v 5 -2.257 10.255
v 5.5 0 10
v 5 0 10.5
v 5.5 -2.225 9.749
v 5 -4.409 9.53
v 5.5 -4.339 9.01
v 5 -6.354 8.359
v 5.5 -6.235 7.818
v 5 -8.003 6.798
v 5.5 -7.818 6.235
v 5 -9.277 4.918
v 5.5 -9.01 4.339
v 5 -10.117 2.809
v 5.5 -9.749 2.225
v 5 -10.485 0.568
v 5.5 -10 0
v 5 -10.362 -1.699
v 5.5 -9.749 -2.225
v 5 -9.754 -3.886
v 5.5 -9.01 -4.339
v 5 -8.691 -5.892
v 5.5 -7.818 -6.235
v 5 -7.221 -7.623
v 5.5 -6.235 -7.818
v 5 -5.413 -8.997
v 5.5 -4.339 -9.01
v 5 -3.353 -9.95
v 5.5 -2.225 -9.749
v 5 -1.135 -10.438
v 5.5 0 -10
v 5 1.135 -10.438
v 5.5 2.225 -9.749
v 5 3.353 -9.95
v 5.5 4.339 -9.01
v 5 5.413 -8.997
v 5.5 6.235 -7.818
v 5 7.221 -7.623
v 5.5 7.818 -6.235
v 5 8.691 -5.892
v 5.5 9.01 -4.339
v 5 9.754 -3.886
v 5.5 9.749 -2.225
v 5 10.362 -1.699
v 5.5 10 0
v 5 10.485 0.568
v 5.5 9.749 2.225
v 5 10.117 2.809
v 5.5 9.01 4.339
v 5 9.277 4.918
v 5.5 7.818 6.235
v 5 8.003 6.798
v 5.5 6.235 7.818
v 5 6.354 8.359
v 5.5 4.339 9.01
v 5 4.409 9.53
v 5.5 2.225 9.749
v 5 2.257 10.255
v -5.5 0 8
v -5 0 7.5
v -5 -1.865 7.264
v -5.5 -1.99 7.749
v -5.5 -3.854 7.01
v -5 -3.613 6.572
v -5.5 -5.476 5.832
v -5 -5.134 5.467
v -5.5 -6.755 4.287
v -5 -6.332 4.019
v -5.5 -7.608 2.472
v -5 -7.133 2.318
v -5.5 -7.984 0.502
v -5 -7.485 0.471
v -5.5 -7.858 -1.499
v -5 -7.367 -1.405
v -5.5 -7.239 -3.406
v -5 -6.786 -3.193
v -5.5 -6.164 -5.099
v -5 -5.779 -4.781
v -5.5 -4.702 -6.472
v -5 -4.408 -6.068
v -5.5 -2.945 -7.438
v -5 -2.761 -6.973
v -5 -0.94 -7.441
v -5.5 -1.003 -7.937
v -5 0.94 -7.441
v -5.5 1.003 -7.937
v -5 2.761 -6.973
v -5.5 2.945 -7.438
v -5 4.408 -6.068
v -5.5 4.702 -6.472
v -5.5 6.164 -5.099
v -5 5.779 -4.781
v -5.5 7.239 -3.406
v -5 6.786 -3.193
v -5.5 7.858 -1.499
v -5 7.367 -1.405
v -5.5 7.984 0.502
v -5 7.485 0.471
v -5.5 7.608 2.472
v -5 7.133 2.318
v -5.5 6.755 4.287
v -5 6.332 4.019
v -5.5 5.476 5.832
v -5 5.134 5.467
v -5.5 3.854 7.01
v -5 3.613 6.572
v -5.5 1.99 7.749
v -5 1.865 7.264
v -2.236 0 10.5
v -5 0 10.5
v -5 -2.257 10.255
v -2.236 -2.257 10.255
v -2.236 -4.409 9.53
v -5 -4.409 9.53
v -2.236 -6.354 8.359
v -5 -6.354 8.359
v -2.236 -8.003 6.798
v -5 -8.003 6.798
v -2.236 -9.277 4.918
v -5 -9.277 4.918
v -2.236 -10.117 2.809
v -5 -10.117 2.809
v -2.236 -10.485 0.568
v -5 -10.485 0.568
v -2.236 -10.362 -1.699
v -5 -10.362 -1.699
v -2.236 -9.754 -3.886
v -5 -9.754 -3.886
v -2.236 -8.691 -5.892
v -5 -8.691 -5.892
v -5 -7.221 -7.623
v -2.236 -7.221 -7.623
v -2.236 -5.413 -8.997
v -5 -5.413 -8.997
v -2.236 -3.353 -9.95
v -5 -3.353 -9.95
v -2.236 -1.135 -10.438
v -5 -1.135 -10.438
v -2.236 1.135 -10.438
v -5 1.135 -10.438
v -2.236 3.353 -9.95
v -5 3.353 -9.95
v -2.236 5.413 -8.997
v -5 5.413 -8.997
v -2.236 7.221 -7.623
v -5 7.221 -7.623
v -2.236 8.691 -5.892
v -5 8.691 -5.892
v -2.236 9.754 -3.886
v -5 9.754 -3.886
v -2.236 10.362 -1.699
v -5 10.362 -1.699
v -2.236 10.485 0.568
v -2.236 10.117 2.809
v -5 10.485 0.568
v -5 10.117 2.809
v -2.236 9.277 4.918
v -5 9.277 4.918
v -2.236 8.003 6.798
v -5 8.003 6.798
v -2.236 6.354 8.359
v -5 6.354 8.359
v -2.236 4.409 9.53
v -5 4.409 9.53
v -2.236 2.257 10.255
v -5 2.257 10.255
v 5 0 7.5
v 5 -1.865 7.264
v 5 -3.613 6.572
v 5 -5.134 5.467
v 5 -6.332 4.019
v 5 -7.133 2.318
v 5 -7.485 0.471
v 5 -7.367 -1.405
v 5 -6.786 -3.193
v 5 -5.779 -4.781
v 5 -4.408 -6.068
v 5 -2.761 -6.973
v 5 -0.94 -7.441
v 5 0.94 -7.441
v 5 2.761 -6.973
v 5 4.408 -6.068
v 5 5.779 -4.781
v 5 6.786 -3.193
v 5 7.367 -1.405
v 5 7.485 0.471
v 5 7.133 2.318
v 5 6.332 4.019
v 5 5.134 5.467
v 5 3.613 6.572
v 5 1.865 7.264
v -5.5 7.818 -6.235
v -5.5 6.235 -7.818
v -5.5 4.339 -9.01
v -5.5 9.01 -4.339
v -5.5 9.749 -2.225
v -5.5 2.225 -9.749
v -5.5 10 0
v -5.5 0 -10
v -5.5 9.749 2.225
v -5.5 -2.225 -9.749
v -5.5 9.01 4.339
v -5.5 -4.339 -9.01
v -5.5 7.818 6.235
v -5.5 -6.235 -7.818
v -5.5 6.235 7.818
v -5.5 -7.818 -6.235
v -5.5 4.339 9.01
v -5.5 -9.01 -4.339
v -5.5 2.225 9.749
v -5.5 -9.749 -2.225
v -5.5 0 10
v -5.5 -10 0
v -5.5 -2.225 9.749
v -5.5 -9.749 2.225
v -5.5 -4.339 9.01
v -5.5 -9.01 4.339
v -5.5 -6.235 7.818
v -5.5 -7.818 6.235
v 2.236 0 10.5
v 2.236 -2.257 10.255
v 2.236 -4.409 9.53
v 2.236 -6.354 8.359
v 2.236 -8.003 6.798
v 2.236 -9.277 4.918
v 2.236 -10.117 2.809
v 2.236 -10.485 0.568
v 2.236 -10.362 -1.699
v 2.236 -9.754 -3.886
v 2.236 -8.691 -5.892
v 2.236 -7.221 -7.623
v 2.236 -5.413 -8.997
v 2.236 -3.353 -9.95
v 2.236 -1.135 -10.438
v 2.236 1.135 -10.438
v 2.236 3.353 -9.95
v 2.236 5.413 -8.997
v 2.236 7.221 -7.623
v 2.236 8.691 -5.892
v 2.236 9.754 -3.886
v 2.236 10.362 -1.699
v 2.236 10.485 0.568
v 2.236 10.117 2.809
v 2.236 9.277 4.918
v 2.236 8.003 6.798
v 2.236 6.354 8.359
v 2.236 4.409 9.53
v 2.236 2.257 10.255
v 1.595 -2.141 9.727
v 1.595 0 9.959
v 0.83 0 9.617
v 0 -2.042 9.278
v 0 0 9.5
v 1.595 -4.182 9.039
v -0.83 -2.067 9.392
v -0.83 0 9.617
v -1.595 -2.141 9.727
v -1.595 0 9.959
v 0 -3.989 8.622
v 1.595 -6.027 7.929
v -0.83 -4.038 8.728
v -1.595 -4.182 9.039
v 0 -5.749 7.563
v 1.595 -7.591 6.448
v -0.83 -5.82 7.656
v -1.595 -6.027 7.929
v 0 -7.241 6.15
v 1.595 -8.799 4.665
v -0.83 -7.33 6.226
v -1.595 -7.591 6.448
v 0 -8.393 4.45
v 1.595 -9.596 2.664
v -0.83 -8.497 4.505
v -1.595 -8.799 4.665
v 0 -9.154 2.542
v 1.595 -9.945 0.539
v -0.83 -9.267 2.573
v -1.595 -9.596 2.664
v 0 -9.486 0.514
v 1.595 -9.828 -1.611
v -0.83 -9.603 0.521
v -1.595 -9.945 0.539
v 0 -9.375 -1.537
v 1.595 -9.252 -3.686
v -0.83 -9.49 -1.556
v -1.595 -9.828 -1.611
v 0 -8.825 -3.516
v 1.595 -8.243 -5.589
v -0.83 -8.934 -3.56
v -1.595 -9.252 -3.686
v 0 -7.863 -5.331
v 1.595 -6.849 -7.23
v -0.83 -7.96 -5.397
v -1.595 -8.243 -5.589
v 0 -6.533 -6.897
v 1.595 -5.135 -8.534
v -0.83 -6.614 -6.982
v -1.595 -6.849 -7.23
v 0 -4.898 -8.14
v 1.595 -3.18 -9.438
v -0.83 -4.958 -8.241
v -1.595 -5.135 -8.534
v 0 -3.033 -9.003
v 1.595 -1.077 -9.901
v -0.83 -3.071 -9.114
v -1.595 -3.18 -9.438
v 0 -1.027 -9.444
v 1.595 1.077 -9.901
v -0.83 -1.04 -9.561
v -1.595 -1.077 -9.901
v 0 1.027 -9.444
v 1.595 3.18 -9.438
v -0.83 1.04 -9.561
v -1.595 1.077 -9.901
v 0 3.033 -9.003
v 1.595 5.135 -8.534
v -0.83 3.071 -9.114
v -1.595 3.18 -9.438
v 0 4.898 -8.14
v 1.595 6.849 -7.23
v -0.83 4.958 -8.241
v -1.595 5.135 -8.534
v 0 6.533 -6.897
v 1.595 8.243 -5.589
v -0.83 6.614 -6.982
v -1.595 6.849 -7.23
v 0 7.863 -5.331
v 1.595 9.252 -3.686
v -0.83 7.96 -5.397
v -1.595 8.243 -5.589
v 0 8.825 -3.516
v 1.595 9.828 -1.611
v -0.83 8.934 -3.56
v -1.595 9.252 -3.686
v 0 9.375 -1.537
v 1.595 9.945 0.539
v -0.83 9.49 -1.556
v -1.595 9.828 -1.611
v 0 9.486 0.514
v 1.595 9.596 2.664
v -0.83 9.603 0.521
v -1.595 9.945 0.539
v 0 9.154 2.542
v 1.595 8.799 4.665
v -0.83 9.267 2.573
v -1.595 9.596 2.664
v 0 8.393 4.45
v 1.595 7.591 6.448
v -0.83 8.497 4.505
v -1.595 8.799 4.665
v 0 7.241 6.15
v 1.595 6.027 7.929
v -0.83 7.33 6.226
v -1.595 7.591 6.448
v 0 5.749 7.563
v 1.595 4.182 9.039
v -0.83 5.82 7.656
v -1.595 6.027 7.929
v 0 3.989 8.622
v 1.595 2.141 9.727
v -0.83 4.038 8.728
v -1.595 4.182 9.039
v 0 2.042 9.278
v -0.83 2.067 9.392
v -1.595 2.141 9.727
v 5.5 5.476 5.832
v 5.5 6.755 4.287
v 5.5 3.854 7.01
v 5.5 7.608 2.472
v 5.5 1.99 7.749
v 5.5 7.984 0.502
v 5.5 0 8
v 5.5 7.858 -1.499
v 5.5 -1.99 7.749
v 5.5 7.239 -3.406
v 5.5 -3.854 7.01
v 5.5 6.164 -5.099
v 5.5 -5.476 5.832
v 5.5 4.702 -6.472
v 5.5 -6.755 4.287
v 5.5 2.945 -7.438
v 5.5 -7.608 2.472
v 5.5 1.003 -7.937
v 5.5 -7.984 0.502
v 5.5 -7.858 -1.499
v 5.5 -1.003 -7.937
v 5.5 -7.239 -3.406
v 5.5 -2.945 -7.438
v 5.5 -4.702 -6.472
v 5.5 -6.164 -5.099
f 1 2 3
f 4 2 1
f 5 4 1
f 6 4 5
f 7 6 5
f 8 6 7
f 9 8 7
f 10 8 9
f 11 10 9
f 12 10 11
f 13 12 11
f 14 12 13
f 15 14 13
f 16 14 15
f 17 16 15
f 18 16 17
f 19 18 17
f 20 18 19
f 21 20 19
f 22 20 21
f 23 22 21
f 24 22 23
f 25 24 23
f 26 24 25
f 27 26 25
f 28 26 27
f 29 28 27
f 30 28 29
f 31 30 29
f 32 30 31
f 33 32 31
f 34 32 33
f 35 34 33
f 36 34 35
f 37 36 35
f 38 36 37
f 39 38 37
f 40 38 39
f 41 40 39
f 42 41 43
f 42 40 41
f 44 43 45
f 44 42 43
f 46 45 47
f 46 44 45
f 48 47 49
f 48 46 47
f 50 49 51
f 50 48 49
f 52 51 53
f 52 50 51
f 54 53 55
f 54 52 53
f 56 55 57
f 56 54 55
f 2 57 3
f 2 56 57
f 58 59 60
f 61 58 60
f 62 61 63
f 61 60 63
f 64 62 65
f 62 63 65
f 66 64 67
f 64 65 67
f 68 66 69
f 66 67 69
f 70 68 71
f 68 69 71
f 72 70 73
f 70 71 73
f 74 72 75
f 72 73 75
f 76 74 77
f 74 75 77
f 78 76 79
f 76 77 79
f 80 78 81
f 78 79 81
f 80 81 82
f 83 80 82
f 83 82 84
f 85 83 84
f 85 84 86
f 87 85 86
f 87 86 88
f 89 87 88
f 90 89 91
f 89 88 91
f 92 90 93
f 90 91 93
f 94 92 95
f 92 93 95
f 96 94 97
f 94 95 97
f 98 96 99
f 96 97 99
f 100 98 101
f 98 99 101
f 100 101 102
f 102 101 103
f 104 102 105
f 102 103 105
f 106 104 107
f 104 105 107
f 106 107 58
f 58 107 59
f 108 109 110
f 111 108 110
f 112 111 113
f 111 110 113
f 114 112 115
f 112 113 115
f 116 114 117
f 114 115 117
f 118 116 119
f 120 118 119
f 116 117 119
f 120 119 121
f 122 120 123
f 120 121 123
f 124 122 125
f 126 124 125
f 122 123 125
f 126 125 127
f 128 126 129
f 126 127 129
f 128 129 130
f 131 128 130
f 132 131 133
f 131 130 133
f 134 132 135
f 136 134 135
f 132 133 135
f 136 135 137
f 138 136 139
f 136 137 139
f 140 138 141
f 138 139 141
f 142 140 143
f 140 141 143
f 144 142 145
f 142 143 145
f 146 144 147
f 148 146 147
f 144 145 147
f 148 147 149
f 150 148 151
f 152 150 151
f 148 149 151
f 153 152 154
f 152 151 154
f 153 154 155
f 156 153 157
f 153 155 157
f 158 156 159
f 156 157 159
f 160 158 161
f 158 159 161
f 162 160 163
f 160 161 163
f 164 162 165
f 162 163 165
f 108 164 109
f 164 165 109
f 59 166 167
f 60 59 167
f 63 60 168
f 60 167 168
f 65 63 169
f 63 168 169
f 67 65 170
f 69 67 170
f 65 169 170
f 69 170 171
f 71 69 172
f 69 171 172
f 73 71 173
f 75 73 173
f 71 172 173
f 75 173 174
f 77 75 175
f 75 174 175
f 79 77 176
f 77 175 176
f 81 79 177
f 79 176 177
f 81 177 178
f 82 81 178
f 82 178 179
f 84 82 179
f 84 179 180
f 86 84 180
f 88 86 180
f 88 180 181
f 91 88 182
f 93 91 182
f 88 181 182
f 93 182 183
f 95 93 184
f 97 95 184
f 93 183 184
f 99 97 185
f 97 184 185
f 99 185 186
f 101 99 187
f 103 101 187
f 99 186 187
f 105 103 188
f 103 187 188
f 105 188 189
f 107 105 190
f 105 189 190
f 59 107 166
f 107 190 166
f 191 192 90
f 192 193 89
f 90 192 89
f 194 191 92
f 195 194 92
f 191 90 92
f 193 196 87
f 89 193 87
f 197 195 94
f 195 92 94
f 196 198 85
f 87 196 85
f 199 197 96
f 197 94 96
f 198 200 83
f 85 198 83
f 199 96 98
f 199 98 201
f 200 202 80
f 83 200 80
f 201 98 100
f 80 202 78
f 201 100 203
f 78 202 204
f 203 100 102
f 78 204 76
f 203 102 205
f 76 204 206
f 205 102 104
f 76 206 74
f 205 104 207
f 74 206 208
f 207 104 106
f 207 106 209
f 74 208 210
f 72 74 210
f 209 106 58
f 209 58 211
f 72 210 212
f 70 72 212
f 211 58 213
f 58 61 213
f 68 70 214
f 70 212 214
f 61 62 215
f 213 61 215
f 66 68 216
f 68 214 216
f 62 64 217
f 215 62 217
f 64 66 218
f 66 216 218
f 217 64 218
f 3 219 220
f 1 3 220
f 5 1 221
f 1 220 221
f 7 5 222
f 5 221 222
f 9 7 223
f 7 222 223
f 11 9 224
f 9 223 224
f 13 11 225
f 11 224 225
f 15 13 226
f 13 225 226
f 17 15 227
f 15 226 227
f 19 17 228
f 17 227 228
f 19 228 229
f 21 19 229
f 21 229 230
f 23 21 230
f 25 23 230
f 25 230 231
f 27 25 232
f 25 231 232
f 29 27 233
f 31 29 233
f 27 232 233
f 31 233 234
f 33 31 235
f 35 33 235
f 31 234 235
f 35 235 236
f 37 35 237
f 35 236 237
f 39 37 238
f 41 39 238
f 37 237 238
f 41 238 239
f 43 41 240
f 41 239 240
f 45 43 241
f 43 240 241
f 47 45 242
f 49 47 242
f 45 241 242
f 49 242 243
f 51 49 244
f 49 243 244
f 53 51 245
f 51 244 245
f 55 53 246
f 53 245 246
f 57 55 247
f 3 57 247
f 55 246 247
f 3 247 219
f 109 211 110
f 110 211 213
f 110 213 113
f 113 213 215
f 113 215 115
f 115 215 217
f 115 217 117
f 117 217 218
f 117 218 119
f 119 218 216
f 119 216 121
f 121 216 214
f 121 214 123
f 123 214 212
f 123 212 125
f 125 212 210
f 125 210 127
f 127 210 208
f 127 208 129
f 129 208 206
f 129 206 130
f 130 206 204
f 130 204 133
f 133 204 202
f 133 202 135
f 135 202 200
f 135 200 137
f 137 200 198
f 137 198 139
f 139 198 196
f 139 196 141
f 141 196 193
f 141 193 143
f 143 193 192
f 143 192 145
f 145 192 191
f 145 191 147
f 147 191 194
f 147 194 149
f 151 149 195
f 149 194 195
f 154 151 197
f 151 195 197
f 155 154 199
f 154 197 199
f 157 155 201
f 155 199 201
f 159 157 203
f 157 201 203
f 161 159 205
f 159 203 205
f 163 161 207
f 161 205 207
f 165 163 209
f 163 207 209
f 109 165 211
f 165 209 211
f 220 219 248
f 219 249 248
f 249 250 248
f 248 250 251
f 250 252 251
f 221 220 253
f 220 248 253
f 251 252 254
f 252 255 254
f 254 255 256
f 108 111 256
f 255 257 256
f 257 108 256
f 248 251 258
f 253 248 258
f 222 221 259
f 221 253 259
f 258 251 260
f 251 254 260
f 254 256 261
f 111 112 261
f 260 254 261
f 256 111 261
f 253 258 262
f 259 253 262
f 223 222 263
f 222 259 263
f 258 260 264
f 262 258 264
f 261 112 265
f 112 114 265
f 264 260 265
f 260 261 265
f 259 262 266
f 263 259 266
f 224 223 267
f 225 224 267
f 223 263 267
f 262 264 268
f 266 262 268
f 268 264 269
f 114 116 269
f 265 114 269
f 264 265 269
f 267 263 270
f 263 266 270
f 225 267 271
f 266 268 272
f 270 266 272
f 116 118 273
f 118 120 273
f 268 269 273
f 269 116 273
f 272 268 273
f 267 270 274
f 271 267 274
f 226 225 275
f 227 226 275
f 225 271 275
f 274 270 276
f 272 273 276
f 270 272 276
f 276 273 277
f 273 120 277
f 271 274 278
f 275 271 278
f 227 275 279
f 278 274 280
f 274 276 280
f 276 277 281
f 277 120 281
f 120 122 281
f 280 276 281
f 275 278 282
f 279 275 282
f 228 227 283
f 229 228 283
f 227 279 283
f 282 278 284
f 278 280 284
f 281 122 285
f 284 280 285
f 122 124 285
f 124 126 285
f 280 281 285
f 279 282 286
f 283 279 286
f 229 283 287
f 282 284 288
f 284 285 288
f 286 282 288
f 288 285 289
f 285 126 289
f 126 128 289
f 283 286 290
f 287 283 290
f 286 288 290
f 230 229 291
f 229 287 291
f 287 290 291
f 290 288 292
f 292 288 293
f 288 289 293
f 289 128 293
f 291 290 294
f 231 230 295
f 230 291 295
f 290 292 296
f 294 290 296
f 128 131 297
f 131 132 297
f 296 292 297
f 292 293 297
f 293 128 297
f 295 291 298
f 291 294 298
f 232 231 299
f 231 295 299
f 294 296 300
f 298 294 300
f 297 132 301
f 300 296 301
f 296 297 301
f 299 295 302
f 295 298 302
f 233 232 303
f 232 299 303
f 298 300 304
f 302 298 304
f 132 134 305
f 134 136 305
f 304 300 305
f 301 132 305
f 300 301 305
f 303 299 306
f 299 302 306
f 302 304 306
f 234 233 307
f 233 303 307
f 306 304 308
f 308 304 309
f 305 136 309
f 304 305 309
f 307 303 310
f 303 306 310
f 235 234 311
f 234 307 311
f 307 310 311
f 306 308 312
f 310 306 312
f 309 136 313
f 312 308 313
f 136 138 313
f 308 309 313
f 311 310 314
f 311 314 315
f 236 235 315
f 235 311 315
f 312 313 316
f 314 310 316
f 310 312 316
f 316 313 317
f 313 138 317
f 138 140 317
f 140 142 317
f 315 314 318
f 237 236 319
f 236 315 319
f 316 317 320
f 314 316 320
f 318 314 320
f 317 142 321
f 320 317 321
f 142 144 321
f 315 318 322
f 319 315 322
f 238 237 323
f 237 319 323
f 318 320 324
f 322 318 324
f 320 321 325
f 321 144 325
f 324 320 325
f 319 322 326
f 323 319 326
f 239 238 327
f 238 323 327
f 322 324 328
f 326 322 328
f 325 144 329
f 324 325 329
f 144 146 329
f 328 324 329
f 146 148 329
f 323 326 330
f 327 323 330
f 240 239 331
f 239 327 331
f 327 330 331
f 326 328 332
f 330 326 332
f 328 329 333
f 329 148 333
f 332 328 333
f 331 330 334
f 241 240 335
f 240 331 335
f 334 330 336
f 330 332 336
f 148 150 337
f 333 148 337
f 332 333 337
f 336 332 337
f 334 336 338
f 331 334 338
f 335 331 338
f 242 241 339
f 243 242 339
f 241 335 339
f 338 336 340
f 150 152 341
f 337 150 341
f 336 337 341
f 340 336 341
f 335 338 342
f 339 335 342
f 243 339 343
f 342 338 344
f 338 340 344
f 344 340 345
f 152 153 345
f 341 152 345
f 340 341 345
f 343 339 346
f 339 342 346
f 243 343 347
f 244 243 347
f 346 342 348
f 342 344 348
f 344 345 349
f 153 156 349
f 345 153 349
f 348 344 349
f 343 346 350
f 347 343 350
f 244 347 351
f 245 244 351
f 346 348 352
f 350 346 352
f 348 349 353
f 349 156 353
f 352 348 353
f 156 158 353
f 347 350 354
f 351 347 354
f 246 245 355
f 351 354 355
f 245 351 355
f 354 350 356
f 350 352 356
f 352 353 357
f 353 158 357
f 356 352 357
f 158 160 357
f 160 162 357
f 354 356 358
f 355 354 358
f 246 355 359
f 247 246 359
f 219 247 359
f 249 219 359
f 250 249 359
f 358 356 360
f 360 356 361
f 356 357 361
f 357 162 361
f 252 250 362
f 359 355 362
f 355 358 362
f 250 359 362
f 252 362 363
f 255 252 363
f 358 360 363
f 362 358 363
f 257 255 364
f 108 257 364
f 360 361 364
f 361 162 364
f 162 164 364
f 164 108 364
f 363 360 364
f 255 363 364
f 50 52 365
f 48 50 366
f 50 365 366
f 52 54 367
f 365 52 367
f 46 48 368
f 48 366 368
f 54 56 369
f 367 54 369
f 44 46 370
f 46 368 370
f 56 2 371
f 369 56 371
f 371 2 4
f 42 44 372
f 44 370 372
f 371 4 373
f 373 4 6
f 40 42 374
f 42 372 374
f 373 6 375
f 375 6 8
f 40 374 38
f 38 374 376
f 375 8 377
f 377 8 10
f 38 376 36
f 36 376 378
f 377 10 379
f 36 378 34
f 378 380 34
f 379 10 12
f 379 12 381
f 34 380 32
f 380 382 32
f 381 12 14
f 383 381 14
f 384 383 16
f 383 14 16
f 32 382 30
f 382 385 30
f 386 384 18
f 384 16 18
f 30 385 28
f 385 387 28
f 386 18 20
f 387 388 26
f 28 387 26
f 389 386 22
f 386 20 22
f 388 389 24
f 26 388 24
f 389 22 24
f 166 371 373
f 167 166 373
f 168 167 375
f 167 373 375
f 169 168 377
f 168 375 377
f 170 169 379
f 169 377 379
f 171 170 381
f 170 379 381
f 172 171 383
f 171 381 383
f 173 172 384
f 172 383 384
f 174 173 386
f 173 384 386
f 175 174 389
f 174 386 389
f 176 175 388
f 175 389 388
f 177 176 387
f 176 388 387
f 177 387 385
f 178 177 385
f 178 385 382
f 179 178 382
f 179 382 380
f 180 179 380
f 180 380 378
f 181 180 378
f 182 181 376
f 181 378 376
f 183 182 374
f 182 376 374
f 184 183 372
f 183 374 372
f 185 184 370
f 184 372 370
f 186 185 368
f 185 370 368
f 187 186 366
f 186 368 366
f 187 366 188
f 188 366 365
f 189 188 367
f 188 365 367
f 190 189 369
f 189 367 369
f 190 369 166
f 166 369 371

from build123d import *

# Parameters (mm, degrees)
CHAMFER1_SIZE = 0.5


with BuildPart() as part:
    # Sketch1 → Revolve1 (revolve)
    with BuildSketch(Plane.XY, mode=Mode.PRIVATE) as revolve1_sk:
        with BuildLine():
            Line((5.5, 10.5), (2.236067977, 10.5))
            ThreePointArc((2.236067977, 10.5), (0, 9.5), (-2.236067977, 10.5))
            Line((-2.236067977, 10.5), (-5.5, 10.5))
            Line((-5.5, 10.5), (-5.5, 7.5))
            Line((-5.5, 7.5), (5.5, 7.5))
            Line((5.5, 7.5), (5.5, 10.5))
        make_face()
    revolve(revolve1_sk.sketch.rotate(Axis((-28.291139241, 0, 0), (1, 0, 0)), 90), axis=Axis((-28.291139241, 0, 0), (1, 0, 0)))

    # Chamfer1
    chamfer1_edges = [part.edges().sort_by_distance(p)[0] for p in [
        (-5.5, 0, -10.5),
        (5.5, 0, -10.5),
        (5.5, 0, -7.5),
        (-5.5, 0, -7.5),
    ]]
    chamfer(chamfer1_edges, length=CHAMFER1_SIZE)


solid = part.part
